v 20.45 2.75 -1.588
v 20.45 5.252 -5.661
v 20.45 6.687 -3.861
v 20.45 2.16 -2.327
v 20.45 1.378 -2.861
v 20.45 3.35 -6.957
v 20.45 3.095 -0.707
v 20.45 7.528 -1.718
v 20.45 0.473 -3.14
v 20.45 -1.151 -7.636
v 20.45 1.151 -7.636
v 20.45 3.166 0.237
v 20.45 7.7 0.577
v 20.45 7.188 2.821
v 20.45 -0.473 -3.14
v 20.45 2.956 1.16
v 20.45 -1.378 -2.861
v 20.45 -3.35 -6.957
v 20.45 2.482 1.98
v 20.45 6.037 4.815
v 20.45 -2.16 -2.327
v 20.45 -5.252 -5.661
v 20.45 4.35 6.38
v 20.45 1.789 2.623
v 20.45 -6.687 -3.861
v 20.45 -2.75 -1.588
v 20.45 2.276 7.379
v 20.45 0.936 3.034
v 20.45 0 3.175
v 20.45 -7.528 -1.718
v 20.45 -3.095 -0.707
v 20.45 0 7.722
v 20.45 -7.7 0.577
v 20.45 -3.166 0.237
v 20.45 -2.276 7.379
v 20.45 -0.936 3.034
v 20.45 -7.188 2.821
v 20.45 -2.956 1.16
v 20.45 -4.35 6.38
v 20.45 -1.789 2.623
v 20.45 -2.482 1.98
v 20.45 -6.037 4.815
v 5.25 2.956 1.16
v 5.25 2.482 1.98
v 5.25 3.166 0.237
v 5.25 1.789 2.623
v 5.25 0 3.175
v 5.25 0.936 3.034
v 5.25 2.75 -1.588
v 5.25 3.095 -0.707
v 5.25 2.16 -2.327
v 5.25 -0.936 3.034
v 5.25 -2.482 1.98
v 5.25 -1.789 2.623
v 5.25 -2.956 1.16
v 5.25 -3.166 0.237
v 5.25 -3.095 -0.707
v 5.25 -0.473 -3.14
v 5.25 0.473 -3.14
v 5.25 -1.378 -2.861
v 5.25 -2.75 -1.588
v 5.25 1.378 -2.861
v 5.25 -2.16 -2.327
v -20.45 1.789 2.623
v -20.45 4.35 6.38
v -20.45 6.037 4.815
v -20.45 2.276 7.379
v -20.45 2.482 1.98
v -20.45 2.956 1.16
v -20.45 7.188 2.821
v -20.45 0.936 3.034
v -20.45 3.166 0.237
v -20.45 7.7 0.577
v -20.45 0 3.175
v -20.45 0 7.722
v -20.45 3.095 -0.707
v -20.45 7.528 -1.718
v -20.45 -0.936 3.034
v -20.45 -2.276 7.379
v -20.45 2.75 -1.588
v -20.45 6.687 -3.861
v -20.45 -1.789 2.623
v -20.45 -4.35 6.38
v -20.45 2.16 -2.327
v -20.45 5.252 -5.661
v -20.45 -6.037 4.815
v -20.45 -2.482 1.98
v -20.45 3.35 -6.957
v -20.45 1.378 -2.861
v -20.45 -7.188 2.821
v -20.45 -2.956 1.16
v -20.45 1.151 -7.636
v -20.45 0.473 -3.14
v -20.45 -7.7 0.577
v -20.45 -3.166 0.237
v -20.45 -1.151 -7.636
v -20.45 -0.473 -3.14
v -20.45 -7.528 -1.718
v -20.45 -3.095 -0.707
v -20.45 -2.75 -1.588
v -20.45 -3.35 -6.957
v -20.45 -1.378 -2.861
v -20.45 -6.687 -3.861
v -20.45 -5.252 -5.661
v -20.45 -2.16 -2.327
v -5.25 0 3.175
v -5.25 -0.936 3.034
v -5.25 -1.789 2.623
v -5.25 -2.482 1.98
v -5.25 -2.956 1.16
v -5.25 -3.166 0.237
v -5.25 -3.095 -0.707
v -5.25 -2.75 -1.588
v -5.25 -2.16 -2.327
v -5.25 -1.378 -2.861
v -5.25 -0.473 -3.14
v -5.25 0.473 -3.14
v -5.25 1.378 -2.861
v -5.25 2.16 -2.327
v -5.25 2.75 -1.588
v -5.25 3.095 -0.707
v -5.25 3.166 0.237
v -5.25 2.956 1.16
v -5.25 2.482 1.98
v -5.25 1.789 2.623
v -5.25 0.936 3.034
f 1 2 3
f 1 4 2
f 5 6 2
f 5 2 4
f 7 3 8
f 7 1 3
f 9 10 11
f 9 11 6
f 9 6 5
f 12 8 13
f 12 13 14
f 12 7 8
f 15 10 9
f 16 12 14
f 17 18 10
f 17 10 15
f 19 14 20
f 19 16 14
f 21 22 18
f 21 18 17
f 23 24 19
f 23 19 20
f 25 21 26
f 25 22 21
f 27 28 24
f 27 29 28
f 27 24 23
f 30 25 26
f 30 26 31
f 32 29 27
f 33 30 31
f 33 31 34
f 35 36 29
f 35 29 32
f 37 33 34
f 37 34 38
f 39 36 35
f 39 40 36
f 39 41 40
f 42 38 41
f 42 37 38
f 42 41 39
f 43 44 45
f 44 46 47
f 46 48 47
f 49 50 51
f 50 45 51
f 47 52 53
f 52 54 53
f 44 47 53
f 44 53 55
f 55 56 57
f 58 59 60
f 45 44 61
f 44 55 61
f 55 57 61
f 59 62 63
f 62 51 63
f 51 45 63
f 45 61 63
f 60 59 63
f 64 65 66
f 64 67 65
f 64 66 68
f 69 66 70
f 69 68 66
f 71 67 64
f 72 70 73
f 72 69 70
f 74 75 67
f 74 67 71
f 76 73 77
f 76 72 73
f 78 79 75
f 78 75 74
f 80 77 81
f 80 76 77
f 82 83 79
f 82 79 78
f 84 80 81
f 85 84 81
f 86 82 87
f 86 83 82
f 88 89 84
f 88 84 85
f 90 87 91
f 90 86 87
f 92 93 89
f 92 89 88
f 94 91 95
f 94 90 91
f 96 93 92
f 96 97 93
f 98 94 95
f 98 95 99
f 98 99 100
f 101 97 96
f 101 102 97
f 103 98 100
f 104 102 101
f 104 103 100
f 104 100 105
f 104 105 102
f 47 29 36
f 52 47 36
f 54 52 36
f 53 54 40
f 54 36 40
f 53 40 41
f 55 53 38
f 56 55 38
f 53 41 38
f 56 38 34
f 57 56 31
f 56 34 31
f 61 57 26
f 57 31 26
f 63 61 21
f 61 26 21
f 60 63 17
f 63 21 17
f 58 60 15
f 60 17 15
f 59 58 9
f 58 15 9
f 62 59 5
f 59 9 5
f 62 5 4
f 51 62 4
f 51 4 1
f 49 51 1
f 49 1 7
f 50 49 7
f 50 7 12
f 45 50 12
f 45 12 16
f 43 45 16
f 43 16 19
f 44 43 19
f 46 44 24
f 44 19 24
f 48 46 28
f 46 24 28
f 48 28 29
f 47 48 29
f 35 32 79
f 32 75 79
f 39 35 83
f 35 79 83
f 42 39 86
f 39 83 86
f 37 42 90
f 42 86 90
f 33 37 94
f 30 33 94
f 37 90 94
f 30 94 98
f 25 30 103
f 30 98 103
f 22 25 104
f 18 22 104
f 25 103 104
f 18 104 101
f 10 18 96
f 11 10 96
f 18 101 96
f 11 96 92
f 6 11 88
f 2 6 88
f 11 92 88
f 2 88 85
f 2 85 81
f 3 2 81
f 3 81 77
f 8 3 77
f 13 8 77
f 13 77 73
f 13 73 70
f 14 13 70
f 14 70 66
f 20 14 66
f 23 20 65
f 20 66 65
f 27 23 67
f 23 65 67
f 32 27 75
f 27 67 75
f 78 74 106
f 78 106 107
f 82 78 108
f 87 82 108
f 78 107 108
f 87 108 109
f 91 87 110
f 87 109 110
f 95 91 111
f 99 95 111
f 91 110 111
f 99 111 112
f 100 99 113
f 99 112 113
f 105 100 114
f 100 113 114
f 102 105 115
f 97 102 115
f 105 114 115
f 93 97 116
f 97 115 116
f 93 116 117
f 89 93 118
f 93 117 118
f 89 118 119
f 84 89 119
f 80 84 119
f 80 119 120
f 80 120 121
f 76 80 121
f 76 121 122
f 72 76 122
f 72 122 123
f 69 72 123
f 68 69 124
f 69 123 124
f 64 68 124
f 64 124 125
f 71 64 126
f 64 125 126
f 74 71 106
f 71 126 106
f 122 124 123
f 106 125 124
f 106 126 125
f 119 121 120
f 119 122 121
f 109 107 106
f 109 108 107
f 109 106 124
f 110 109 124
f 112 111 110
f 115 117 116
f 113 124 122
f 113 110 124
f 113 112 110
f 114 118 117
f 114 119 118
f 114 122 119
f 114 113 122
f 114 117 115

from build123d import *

# Parameters (mm, degrees)
SOCKET_1_SKETCH_W = 16.2
SOCKET_1_SKETCH_H = 3.175
SOCKET_2_SKETCH_W = 16.2
SOCKET_2_SKETCH_H = 3.175


with BuildPart() as part:
    # Union_T4 Sketch → Union_T4 (revolve)
    with BuildSketch(Plane.XY):
        Polygon((-20.45, 0), (-20.45, 7.722), (-3.45, 7.722), (3.45, 7.722), (20.45, 7.722), (20.45, 0), align=None)
    revolve(axis=Axis((-1000, 0, 0), (1, 0, 0)))

    # Socket 1 Sketch → Socket 1 (revolve, cut)
    with BuildSketch(Plane.XY):
        with Locations((-13.35, 1.5875)):
            Rectangle(SOCKET_1_SKETCH_W, SOCKET_1_SKETCH_H)
    revolve(axis=Axis((-1000, 0, 0), (1, 0, 0)), mode=Mode.SUBTRACT)

    # Socket 2 Sketch → Socket 2 (revolve, cut)
    with BuildSketch(Plane.XY):
        with Locations((13.35, 1.5875)):
            Rectangle(SOCKET_2_SKETCH_W, SOCKET_2_SKETCH_H)
    revolve(axis=Axis((-1000, 0, 0), (1, 0, 0)), mode=Mode.SUBTRACT)


solid = part.part
